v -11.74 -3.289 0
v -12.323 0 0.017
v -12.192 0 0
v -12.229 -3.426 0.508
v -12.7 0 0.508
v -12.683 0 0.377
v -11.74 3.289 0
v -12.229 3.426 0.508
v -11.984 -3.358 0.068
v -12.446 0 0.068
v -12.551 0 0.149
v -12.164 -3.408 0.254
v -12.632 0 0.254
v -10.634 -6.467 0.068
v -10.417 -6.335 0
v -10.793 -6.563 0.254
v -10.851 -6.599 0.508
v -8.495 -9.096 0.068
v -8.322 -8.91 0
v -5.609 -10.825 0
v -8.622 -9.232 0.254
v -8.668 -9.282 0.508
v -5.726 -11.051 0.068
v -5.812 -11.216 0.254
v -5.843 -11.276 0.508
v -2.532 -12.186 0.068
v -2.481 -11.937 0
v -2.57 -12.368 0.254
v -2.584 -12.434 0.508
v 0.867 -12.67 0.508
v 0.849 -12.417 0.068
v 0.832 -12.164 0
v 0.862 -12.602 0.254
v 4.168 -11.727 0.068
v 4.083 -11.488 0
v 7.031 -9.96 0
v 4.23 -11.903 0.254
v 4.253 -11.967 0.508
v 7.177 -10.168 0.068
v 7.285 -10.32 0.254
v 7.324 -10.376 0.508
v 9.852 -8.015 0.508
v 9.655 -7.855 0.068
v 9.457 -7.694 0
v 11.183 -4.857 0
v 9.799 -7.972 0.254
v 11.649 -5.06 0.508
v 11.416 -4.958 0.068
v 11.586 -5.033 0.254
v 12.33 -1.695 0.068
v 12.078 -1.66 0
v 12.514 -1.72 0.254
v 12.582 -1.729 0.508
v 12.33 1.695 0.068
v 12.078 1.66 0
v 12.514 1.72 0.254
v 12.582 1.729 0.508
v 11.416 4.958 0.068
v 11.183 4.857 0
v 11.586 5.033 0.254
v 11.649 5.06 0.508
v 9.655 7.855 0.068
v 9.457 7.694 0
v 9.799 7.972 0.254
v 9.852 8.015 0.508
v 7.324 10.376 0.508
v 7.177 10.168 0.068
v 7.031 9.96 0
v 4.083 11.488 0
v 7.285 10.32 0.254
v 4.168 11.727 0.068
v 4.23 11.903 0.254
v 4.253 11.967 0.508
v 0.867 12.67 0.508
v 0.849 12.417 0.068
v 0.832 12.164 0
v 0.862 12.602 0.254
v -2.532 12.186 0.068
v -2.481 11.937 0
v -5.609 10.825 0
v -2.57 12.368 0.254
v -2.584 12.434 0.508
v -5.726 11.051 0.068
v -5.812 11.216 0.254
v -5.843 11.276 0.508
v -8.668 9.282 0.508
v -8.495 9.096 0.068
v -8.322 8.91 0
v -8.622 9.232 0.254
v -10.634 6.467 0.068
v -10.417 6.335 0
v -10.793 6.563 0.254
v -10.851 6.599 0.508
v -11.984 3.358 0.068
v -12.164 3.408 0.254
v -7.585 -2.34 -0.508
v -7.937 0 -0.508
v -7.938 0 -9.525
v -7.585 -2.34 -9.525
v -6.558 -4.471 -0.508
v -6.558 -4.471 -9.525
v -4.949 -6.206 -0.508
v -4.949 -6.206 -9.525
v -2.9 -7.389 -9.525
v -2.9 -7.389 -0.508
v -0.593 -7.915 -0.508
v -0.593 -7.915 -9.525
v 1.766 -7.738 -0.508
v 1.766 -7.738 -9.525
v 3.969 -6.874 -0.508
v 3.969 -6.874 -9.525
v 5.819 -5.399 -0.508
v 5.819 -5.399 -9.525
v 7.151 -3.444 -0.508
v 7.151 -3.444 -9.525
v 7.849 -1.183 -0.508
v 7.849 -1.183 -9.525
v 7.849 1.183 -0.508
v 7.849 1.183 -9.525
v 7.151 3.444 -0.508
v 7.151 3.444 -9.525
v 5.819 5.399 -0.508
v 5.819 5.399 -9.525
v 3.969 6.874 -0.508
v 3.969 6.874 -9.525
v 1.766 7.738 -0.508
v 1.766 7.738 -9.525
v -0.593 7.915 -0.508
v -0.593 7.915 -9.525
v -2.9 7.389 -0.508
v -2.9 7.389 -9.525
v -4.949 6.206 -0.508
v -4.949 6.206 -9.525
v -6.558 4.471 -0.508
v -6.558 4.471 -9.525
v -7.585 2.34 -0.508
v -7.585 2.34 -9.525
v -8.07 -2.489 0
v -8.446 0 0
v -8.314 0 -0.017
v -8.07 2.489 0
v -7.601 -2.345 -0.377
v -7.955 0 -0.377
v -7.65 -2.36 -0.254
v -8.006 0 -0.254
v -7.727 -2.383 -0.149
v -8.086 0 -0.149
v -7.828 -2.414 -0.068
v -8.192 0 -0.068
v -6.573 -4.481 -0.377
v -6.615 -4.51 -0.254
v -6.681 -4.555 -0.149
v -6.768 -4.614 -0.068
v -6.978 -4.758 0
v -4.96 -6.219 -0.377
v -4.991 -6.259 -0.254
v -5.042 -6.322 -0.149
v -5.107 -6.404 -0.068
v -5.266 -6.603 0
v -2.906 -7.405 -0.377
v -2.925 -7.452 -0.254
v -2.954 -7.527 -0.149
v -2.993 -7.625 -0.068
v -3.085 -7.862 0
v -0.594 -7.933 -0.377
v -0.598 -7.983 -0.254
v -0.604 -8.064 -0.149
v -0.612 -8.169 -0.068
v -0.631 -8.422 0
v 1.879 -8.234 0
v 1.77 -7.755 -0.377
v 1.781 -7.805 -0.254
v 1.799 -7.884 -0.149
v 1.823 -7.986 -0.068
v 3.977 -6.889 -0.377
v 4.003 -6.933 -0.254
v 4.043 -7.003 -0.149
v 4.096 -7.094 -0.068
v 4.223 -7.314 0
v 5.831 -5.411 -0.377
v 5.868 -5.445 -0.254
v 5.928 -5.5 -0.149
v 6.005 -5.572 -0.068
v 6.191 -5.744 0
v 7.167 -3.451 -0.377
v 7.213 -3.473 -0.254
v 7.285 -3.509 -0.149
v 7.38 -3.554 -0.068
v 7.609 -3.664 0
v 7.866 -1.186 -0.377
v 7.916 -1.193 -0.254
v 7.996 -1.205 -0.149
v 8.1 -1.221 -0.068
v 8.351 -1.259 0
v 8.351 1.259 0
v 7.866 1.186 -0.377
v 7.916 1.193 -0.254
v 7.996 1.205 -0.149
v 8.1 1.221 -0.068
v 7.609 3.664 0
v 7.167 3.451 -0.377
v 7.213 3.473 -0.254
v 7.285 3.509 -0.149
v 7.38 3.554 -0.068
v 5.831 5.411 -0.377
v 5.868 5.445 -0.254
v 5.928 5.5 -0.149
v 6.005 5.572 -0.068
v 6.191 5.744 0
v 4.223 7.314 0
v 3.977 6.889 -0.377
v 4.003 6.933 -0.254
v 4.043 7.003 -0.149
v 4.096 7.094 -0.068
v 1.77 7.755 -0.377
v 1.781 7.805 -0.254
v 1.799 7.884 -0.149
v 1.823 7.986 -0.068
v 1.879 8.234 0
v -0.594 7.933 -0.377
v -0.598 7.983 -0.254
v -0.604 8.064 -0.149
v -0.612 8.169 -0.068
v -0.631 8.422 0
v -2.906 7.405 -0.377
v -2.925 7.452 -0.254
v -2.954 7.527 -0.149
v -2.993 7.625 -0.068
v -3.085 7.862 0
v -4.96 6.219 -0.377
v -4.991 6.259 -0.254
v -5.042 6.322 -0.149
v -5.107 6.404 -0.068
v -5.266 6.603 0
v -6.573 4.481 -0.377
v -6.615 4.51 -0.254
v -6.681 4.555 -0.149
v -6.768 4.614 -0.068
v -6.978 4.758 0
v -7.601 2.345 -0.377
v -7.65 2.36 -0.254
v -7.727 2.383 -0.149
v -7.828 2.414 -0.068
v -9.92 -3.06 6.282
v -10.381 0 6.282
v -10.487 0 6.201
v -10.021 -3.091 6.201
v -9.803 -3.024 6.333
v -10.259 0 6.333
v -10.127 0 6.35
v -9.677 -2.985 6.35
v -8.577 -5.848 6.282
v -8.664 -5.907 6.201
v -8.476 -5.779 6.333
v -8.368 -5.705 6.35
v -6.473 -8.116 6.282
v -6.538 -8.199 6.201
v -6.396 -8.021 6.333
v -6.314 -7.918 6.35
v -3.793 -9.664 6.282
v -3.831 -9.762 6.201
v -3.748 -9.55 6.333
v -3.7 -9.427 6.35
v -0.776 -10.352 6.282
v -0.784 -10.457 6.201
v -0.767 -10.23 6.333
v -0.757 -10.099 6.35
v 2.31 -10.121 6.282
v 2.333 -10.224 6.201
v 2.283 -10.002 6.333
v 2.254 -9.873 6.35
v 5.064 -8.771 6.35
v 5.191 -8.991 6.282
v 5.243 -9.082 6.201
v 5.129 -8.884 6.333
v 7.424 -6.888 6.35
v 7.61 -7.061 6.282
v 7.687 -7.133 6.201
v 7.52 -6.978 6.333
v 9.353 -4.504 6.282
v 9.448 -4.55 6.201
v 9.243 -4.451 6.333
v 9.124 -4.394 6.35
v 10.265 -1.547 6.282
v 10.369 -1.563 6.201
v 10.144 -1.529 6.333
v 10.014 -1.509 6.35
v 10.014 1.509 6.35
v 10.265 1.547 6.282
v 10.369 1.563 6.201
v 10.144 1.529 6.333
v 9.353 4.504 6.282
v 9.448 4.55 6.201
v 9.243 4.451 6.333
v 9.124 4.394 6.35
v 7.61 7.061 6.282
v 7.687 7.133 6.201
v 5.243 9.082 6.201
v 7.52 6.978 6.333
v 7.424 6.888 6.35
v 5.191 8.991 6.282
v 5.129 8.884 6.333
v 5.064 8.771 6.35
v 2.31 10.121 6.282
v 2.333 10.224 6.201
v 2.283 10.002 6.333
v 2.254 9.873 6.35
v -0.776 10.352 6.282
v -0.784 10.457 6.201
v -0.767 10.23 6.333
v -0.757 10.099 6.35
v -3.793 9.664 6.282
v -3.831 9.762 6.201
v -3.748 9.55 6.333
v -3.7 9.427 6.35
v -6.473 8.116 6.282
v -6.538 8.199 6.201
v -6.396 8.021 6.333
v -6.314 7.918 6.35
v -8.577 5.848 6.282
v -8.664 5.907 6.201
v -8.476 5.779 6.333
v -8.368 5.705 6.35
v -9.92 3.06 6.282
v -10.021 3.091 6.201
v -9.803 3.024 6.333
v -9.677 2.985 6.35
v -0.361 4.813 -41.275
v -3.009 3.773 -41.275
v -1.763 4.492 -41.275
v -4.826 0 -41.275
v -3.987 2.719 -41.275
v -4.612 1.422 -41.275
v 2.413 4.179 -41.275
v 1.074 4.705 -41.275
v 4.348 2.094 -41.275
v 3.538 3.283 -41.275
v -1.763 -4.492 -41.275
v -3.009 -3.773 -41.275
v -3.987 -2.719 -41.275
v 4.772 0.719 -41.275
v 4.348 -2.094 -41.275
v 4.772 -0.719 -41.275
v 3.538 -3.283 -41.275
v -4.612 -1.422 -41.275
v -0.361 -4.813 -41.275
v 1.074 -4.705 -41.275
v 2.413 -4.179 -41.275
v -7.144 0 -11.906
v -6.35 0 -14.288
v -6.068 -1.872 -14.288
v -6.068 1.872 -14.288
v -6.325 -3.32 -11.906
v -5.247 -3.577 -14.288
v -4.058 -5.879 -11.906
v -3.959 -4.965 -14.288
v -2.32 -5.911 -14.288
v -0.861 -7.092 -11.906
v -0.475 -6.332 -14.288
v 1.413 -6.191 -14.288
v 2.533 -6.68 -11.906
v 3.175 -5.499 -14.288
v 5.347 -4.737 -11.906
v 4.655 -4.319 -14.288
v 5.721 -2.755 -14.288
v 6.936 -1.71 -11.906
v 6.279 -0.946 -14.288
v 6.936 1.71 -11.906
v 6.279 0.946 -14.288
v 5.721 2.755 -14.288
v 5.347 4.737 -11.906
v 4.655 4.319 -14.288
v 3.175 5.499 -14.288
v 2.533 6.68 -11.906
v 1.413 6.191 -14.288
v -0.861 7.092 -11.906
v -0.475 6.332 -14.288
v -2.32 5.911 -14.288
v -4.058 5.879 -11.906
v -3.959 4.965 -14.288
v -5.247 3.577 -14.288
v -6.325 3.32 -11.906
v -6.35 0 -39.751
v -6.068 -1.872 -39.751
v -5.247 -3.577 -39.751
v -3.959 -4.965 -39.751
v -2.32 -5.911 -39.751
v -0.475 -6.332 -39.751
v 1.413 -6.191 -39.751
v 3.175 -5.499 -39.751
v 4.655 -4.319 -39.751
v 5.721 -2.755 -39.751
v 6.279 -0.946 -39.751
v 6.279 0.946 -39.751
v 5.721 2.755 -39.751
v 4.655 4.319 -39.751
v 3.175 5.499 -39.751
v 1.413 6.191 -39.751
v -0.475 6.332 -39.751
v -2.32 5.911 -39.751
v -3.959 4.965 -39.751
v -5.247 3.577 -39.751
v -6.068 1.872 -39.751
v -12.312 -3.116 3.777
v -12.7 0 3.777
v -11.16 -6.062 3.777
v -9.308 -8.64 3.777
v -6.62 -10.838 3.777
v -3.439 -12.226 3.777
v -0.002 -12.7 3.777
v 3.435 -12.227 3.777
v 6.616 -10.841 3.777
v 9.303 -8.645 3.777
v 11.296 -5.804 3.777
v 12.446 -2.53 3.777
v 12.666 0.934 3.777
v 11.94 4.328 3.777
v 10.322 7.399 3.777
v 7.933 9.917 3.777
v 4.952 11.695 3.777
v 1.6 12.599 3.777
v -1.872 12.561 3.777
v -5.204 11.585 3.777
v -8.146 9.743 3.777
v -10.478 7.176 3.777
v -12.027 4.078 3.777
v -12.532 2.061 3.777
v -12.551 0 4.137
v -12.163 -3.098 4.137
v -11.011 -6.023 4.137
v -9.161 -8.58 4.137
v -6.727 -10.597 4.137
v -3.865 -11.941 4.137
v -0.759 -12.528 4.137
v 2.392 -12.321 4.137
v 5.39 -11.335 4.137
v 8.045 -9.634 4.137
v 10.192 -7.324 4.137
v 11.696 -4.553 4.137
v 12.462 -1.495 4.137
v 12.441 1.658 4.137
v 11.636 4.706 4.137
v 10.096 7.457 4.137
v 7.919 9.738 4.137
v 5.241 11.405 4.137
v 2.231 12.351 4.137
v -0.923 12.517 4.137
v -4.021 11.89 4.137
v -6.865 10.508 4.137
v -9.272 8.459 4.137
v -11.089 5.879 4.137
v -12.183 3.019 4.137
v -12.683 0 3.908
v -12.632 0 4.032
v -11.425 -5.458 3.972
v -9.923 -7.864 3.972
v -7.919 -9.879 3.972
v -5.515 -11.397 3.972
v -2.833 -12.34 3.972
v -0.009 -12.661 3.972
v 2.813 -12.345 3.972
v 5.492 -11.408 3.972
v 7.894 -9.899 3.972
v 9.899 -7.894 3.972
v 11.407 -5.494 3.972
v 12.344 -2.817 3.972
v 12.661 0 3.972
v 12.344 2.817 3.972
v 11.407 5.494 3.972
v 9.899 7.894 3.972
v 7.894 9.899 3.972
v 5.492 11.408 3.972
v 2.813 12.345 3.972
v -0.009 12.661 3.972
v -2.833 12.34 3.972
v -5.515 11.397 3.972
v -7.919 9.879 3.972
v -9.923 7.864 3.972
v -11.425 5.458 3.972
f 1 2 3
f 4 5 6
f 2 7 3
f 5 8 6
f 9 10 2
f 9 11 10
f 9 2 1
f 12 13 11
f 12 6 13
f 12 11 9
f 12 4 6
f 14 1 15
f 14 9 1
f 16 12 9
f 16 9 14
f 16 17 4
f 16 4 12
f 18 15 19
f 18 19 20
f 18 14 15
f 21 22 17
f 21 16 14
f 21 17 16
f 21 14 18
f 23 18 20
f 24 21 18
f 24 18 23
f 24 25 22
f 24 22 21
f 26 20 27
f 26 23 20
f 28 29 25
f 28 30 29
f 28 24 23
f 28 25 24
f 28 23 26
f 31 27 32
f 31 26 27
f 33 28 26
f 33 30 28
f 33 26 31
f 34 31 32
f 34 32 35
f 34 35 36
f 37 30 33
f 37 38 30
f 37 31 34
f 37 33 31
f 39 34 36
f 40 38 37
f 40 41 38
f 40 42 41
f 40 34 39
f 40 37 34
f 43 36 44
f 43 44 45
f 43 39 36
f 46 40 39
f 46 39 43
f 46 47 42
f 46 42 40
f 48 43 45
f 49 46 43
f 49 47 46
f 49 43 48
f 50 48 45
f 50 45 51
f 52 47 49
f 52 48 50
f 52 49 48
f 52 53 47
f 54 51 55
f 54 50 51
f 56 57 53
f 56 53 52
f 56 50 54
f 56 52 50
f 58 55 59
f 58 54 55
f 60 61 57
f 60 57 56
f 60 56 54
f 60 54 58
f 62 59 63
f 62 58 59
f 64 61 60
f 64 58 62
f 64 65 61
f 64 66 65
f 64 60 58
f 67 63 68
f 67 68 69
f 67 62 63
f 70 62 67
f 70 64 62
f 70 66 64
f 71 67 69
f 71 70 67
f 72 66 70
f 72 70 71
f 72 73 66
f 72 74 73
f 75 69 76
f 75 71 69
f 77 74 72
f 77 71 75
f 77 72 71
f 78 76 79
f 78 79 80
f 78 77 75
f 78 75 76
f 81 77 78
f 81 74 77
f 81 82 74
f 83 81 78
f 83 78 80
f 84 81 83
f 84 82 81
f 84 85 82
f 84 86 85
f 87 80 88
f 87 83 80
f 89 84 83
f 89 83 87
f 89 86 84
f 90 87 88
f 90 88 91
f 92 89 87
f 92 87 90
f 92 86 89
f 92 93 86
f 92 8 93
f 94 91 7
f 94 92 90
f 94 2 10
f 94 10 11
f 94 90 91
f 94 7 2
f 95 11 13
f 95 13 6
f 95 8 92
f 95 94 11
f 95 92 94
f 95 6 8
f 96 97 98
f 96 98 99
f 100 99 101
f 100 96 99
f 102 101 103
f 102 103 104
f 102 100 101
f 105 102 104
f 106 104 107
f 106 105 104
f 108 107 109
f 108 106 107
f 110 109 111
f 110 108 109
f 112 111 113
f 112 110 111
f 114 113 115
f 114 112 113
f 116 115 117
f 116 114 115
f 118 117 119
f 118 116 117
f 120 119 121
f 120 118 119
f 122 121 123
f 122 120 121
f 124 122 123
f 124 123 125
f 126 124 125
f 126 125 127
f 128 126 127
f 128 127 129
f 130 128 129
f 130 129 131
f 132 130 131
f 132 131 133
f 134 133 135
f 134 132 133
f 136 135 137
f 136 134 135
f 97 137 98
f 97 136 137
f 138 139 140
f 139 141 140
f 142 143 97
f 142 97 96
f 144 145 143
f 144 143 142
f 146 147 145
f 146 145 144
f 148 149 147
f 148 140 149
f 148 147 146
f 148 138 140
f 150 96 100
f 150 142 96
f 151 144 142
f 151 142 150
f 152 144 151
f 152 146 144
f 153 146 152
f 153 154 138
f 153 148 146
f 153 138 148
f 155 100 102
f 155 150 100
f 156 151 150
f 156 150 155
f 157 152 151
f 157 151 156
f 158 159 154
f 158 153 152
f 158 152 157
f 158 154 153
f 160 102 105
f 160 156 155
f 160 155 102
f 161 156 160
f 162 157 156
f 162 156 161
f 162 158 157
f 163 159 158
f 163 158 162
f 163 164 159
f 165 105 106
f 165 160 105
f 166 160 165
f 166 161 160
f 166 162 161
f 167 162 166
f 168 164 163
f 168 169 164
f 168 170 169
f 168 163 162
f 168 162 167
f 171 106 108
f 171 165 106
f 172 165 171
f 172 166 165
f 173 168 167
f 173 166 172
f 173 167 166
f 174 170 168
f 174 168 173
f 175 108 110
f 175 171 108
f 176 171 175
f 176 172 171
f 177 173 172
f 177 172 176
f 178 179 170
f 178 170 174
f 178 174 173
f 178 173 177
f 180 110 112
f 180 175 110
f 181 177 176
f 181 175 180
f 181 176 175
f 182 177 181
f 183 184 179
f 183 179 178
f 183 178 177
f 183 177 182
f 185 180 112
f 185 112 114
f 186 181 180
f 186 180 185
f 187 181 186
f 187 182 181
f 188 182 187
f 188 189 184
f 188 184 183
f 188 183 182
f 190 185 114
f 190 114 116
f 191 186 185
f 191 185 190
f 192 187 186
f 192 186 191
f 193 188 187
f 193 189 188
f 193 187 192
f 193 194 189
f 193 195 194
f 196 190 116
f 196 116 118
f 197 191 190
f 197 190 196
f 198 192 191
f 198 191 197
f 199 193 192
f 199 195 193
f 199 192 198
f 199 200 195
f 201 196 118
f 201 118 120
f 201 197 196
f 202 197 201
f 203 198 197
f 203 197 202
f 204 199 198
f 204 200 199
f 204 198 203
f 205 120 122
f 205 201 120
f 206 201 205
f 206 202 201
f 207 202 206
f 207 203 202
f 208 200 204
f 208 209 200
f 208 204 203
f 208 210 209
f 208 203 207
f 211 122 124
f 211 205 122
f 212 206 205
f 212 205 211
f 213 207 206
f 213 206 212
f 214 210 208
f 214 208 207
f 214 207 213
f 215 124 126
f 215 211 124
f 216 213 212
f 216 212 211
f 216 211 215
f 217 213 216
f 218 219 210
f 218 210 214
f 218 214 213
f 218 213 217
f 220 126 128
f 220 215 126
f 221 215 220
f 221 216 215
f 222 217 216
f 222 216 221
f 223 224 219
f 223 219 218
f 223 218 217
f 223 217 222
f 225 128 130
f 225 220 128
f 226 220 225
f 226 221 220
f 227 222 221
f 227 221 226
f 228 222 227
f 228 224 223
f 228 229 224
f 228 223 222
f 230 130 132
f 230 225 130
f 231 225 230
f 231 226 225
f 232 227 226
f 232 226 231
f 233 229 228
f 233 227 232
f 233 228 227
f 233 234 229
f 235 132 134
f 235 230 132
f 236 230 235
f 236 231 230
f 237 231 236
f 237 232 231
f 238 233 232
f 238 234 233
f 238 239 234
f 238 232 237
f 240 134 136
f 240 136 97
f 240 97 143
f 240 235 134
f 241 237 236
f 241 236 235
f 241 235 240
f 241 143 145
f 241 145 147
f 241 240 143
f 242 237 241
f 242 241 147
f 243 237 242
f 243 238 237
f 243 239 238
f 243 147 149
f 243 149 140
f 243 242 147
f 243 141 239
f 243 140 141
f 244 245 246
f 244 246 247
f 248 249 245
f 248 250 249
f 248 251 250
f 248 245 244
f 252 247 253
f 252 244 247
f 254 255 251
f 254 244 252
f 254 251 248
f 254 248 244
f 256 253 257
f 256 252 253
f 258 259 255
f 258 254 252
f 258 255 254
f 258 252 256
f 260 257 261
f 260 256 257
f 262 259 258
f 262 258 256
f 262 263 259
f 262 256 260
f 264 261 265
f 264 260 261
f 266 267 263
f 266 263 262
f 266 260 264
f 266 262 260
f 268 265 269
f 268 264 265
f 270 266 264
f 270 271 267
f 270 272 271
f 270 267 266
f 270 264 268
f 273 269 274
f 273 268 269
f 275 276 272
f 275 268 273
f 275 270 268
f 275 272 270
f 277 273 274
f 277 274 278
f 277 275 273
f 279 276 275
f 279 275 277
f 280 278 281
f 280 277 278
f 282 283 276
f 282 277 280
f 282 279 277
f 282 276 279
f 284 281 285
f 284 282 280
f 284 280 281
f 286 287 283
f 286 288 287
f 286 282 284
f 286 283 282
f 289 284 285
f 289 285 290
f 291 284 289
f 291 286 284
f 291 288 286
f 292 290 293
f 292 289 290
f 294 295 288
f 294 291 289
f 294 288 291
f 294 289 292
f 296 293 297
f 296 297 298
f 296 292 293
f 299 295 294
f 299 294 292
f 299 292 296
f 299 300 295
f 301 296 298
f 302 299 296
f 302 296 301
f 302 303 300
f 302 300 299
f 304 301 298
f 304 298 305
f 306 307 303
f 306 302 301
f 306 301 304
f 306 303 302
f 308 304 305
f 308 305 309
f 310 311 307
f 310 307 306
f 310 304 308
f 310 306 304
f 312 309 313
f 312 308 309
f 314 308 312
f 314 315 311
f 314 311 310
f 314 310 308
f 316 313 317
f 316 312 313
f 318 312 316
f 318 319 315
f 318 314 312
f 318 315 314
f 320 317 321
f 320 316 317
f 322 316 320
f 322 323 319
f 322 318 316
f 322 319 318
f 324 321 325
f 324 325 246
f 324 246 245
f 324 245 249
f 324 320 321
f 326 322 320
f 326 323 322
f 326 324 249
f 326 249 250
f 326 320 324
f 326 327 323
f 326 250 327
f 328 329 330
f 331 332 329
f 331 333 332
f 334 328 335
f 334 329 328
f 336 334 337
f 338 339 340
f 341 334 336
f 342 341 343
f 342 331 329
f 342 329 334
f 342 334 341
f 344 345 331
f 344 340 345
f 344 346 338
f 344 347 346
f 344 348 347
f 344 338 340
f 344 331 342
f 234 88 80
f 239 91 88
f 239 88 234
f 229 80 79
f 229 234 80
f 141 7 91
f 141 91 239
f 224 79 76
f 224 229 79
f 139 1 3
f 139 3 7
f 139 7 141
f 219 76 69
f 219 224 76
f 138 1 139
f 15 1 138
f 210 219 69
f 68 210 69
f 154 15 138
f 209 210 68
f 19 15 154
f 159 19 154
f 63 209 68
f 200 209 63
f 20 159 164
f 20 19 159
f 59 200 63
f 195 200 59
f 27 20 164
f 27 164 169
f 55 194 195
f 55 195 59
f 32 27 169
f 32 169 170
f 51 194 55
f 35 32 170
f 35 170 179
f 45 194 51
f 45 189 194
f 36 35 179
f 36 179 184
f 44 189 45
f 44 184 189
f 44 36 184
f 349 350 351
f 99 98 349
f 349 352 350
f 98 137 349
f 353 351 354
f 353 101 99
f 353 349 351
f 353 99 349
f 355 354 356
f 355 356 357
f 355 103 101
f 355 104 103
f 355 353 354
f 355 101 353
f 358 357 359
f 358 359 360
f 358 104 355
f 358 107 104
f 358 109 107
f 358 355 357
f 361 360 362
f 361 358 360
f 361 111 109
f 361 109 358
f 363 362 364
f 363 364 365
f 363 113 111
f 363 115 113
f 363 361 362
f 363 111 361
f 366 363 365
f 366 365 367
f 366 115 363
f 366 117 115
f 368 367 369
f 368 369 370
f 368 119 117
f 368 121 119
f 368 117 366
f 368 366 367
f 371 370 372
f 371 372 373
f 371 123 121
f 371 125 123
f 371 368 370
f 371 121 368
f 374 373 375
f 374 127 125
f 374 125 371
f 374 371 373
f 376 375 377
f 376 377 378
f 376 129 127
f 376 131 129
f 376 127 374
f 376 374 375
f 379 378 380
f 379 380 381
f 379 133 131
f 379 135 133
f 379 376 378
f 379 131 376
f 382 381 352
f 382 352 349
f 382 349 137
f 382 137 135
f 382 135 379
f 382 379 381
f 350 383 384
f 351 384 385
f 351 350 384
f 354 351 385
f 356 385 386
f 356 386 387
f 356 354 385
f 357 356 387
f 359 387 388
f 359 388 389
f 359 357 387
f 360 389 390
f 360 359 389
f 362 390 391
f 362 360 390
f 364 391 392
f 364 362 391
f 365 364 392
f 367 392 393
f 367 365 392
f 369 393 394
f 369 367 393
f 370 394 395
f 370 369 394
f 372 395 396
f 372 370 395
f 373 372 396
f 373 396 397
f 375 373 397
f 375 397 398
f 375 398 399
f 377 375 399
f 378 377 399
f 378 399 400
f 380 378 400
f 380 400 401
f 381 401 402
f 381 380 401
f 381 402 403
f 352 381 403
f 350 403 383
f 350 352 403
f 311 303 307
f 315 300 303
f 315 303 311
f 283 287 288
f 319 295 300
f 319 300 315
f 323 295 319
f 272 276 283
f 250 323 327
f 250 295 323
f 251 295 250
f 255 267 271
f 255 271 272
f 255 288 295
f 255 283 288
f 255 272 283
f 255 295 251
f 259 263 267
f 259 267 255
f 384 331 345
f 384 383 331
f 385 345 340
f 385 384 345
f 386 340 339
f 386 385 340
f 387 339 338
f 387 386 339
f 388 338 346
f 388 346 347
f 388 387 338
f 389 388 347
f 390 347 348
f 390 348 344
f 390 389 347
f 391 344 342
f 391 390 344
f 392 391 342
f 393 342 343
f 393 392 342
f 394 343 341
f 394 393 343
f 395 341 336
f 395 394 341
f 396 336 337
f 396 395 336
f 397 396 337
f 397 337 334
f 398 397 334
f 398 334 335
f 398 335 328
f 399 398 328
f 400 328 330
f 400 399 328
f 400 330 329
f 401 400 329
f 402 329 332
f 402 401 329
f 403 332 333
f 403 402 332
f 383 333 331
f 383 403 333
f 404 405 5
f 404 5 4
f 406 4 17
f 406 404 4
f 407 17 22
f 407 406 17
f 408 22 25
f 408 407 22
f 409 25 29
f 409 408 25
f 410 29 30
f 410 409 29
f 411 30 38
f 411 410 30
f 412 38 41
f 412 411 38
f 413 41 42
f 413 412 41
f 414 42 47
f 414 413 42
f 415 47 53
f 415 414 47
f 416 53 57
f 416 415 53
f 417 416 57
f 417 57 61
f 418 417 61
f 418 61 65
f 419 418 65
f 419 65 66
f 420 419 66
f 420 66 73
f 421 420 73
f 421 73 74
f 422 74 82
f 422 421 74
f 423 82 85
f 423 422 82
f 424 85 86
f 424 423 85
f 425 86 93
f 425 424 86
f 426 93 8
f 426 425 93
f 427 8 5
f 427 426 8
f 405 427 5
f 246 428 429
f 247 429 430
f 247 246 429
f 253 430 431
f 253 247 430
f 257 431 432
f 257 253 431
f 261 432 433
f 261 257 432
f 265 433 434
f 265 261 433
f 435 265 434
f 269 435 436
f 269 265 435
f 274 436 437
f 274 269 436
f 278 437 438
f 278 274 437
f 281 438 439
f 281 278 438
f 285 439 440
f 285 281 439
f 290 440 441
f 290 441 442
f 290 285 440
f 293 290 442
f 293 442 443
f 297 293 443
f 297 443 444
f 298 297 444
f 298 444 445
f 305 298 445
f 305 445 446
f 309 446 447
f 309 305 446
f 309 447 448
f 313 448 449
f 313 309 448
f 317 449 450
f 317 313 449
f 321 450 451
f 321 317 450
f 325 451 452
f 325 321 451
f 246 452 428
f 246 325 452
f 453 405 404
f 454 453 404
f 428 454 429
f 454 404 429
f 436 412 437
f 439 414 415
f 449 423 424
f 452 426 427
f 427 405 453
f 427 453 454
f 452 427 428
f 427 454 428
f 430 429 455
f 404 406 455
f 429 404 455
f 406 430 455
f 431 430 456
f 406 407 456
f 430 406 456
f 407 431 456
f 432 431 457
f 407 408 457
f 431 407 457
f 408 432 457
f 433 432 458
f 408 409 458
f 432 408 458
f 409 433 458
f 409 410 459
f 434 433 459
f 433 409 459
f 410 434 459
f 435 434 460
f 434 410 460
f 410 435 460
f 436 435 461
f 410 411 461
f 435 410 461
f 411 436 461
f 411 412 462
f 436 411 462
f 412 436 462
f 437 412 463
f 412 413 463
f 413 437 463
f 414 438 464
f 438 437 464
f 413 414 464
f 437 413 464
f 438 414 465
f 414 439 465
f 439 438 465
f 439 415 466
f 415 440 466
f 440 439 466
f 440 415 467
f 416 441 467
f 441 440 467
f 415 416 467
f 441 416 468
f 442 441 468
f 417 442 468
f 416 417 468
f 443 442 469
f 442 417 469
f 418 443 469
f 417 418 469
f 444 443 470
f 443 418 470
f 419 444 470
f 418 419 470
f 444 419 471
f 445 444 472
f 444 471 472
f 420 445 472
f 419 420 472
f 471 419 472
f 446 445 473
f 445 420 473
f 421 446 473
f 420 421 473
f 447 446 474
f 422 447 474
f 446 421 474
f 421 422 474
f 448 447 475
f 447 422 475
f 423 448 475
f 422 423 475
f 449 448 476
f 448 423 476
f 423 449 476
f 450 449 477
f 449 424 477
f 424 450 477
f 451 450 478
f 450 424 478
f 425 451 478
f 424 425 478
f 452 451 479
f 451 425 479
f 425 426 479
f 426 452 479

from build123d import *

# Parameters (mm, degrees)
FILLET1_R = 0.508


with BuildPart() as part:
    # Sketch1 → Base-Revolve (revolve)
    with BuildSketch(Plane(origin=(0, 0, 0), x_dir=(0, 0, -1), z_dir=(1, 0, 0)), mode=Mode.PRIVATE) as base_revolve_sk:
        Polygon((-6.35, 0), (41.275, 0), (41.275, 4.826), (39.751, 6.35), (14.2875, 6.35), (9.525, 7.9375), (0, 7.9375), (0, 12.7), (-3.9878, 12.7), (-6.35, 10.3378), align=None)
    revolve(base_revolve_sk.sketch.rotate(Axis((0, 0, 0), (0, 0, 1)), 90), axis=Axis((0, 0, 0), (0, 0, 1)))

    # Fillet1
    fillet1_edges = [part.edges().sort_by_distance(p)[0] for p in [
        (7.9375, 0, 0),
        (12.7, 0, 0),
        (12.7, 0, 3.9878),
        (10.3378, 0, 6.35),
    ]]
    fillet(fillet1_edges, radius=FILLET1_R)


solid = part.part
